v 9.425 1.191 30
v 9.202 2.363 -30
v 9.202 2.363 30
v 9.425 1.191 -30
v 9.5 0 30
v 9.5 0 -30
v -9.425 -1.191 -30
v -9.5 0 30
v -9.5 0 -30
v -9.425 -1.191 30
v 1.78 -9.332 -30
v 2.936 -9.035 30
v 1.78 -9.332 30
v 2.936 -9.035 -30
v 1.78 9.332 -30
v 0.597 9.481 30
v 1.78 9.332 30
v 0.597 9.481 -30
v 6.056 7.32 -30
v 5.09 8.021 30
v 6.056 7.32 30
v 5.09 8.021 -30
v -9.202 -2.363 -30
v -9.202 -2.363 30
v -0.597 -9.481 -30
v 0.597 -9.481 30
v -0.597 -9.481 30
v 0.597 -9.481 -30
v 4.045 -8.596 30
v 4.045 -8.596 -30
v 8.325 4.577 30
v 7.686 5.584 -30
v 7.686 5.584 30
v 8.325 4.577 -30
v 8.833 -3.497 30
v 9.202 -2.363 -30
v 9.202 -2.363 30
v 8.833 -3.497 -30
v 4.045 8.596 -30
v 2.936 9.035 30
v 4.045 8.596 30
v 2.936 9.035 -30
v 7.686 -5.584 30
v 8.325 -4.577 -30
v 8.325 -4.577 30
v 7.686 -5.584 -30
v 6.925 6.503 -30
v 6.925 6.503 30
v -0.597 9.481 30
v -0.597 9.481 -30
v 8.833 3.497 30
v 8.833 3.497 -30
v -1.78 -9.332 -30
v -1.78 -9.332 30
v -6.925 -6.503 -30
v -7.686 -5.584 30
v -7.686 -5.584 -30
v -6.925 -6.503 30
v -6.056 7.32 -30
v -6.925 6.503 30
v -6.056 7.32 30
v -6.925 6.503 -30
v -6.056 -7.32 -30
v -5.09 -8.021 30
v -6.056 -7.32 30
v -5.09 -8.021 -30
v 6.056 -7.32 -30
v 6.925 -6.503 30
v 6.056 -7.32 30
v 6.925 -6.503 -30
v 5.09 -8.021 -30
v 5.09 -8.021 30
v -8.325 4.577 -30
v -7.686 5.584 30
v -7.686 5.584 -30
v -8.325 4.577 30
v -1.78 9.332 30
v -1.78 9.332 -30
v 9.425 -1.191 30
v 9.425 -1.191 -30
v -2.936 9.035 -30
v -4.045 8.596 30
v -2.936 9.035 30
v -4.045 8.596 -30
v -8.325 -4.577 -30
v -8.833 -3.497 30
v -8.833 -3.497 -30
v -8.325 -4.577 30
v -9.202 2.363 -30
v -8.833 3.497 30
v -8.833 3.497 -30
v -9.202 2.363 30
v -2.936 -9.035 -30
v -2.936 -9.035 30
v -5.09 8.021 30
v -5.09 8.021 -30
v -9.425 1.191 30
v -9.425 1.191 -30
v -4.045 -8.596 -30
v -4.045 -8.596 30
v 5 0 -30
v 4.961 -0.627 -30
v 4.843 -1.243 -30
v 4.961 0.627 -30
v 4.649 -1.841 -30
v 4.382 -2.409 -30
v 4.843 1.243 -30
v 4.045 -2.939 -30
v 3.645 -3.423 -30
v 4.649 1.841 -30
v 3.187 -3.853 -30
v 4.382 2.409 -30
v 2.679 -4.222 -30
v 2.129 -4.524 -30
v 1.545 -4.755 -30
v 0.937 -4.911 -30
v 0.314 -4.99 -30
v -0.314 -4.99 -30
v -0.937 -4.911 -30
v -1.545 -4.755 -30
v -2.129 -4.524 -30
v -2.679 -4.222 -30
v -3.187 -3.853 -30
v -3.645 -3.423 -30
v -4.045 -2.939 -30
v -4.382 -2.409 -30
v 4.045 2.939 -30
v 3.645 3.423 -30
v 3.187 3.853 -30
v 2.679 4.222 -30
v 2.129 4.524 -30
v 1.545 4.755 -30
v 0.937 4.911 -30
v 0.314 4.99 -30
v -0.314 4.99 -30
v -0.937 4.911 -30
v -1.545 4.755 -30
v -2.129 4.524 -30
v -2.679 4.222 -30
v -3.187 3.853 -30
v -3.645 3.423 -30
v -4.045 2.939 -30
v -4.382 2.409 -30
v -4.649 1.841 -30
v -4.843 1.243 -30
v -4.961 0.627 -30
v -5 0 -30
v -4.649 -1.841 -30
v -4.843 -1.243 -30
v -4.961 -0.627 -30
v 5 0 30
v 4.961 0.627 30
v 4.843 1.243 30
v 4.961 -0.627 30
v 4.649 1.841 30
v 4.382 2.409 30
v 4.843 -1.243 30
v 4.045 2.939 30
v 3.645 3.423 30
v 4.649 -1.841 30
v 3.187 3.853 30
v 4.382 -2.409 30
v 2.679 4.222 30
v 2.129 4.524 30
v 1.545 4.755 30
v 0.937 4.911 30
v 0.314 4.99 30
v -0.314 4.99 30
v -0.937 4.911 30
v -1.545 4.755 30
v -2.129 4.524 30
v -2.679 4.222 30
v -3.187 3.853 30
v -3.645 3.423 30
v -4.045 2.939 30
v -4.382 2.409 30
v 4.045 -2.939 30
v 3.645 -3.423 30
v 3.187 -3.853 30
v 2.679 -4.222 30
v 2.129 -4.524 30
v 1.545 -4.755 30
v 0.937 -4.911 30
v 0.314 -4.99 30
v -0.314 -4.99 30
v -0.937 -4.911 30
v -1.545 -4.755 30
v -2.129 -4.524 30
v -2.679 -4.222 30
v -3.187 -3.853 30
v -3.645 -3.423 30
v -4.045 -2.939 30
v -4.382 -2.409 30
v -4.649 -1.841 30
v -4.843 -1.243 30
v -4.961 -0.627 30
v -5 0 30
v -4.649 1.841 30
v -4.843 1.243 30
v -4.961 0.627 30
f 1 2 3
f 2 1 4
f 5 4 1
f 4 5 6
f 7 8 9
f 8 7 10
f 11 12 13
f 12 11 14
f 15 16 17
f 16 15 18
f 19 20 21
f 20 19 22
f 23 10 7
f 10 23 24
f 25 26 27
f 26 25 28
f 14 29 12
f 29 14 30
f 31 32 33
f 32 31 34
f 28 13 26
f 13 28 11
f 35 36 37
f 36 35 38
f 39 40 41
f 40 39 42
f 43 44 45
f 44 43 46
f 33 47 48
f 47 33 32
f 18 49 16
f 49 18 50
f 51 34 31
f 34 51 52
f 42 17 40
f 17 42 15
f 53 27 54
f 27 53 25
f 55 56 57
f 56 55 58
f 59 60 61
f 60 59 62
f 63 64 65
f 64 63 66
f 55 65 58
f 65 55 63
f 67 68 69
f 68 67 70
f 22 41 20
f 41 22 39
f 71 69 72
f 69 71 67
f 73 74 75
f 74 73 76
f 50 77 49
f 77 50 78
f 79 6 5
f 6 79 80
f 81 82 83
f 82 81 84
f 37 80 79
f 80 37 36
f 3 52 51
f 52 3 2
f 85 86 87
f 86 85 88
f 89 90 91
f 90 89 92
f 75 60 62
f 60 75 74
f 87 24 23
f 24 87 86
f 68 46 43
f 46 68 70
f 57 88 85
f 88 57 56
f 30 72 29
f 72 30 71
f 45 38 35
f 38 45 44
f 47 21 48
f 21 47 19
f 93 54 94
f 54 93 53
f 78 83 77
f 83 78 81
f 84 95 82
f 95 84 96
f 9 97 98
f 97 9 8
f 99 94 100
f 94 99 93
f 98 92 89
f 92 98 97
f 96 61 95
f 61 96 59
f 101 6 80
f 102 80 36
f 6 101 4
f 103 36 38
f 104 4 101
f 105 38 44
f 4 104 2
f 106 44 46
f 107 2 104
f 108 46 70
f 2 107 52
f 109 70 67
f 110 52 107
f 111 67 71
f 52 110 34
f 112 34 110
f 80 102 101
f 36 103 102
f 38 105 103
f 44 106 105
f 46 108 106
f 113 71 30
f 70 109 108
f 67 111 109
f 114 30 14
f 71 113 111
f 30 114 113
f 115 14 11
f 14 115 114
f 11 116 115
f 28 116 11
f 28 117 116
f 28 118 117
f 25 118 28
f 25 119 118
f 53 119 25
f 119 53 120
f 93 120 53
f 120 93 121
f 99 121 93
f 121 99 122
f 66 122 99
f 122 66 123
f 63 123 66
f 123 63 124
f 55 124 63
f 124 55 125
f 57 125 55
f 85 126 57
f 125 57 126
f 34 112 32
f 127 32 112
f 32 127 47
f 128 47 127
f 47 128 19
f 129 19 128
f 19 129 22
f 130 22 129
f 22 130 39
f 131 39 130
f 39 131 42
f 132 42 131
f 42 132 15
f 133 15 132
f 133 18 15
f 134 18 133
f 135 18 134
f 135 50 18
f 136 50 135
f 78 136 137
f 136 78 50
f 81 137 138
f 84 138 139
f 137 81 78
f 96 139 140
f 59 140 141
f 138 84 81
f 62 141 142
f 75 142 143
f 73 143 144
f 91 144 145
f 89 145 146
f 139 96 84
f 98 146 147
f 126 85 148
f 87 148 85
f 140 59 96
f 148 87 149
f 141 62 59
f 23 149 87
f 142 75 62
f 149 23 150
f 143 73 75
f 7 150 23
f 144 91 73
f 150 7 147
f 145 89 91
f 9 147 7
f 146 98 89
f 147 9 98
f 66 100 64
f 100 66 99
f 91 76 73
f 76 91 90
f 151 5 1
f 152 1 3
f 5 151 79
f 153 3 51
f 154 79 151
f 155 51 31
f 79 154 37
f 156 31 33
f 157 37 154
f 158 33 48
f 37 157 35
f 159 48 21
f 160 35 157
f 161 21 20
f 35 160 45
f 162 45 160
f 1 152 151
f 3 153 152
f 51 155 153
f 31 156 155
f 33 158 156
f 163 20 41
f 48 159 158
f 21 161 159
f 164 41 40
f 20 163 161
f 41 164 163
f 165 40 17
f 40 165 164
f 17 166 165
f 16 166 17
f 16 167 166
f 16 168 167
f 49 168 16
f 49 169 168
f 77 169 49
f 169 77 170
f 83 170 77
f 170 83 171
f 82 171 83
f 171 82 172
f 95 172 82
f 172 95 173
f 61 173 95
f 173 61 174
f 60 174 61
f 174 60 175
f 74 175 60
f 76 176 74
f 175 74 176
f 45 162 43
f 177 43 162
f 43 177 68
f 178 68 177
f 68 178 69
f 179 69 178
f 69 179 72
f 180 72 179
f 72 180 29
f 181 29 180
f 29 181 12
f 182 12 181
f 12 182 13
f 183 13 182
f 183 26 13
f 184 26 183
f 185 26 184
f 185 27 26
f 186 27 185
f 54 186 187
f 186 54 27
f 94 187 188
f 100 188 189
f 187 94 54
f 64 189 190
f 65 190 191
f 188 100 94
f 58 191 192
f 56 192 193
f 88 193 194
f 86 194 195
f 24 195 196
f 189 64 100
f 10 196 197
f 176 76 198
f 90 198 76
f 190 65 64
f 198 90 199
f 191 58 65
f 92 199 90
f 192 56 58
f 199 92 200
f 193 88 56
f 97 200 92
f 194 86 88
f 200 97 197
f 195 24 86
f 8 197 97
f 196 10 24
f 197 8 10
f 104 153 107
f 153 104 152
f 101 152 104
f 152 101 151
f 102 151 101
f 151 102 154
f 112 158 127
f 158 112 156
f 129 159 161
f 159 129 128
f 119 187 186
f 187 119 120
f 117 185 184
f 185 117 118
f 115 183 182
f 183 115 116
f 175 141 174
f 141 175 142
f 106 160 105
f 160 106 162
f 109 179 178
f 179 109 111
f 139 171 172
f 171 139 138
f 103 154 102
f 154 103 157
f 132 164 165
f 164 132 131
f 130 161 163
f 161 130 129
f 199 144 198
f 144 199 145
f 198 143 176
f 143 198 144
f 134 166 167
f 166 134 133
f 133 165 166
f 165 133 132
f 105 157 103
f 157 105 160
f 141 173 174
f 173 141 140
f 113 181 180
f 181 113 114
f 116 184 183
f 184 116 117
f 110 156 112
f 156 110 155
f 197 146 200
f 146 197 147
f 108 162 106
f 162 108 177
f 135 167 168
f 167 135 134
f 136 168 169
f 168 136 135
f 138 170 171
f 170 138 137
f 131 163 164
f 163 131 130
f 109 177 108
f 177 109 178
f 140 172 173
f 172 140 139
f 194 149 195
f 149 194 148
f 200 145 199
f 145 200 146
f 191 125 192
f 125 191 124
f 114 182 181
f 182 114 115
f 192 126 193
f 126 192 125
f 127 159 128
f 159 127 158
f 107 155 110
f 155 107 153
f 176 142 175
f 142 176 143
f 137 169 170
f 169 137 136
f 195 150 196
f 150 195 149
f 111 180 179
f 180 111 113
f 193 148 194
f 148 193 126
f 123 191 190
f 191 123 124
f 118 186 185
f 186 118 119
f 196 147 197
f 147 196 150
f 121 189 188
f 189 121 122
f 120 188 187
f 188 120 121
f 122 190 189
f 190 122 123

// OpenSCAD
$fn = 50;


difference() {
	union() {
		translate(v = [0, 0, -30.0000000000]) {
			cylinder(h = 60, r = 9.5000000000);
		}
	}
	union() {
		translate(v = [0, 0, -100.0000000000]) {
			cylinder(h = 200, r = 5.0000000000);
		}
	}
}
